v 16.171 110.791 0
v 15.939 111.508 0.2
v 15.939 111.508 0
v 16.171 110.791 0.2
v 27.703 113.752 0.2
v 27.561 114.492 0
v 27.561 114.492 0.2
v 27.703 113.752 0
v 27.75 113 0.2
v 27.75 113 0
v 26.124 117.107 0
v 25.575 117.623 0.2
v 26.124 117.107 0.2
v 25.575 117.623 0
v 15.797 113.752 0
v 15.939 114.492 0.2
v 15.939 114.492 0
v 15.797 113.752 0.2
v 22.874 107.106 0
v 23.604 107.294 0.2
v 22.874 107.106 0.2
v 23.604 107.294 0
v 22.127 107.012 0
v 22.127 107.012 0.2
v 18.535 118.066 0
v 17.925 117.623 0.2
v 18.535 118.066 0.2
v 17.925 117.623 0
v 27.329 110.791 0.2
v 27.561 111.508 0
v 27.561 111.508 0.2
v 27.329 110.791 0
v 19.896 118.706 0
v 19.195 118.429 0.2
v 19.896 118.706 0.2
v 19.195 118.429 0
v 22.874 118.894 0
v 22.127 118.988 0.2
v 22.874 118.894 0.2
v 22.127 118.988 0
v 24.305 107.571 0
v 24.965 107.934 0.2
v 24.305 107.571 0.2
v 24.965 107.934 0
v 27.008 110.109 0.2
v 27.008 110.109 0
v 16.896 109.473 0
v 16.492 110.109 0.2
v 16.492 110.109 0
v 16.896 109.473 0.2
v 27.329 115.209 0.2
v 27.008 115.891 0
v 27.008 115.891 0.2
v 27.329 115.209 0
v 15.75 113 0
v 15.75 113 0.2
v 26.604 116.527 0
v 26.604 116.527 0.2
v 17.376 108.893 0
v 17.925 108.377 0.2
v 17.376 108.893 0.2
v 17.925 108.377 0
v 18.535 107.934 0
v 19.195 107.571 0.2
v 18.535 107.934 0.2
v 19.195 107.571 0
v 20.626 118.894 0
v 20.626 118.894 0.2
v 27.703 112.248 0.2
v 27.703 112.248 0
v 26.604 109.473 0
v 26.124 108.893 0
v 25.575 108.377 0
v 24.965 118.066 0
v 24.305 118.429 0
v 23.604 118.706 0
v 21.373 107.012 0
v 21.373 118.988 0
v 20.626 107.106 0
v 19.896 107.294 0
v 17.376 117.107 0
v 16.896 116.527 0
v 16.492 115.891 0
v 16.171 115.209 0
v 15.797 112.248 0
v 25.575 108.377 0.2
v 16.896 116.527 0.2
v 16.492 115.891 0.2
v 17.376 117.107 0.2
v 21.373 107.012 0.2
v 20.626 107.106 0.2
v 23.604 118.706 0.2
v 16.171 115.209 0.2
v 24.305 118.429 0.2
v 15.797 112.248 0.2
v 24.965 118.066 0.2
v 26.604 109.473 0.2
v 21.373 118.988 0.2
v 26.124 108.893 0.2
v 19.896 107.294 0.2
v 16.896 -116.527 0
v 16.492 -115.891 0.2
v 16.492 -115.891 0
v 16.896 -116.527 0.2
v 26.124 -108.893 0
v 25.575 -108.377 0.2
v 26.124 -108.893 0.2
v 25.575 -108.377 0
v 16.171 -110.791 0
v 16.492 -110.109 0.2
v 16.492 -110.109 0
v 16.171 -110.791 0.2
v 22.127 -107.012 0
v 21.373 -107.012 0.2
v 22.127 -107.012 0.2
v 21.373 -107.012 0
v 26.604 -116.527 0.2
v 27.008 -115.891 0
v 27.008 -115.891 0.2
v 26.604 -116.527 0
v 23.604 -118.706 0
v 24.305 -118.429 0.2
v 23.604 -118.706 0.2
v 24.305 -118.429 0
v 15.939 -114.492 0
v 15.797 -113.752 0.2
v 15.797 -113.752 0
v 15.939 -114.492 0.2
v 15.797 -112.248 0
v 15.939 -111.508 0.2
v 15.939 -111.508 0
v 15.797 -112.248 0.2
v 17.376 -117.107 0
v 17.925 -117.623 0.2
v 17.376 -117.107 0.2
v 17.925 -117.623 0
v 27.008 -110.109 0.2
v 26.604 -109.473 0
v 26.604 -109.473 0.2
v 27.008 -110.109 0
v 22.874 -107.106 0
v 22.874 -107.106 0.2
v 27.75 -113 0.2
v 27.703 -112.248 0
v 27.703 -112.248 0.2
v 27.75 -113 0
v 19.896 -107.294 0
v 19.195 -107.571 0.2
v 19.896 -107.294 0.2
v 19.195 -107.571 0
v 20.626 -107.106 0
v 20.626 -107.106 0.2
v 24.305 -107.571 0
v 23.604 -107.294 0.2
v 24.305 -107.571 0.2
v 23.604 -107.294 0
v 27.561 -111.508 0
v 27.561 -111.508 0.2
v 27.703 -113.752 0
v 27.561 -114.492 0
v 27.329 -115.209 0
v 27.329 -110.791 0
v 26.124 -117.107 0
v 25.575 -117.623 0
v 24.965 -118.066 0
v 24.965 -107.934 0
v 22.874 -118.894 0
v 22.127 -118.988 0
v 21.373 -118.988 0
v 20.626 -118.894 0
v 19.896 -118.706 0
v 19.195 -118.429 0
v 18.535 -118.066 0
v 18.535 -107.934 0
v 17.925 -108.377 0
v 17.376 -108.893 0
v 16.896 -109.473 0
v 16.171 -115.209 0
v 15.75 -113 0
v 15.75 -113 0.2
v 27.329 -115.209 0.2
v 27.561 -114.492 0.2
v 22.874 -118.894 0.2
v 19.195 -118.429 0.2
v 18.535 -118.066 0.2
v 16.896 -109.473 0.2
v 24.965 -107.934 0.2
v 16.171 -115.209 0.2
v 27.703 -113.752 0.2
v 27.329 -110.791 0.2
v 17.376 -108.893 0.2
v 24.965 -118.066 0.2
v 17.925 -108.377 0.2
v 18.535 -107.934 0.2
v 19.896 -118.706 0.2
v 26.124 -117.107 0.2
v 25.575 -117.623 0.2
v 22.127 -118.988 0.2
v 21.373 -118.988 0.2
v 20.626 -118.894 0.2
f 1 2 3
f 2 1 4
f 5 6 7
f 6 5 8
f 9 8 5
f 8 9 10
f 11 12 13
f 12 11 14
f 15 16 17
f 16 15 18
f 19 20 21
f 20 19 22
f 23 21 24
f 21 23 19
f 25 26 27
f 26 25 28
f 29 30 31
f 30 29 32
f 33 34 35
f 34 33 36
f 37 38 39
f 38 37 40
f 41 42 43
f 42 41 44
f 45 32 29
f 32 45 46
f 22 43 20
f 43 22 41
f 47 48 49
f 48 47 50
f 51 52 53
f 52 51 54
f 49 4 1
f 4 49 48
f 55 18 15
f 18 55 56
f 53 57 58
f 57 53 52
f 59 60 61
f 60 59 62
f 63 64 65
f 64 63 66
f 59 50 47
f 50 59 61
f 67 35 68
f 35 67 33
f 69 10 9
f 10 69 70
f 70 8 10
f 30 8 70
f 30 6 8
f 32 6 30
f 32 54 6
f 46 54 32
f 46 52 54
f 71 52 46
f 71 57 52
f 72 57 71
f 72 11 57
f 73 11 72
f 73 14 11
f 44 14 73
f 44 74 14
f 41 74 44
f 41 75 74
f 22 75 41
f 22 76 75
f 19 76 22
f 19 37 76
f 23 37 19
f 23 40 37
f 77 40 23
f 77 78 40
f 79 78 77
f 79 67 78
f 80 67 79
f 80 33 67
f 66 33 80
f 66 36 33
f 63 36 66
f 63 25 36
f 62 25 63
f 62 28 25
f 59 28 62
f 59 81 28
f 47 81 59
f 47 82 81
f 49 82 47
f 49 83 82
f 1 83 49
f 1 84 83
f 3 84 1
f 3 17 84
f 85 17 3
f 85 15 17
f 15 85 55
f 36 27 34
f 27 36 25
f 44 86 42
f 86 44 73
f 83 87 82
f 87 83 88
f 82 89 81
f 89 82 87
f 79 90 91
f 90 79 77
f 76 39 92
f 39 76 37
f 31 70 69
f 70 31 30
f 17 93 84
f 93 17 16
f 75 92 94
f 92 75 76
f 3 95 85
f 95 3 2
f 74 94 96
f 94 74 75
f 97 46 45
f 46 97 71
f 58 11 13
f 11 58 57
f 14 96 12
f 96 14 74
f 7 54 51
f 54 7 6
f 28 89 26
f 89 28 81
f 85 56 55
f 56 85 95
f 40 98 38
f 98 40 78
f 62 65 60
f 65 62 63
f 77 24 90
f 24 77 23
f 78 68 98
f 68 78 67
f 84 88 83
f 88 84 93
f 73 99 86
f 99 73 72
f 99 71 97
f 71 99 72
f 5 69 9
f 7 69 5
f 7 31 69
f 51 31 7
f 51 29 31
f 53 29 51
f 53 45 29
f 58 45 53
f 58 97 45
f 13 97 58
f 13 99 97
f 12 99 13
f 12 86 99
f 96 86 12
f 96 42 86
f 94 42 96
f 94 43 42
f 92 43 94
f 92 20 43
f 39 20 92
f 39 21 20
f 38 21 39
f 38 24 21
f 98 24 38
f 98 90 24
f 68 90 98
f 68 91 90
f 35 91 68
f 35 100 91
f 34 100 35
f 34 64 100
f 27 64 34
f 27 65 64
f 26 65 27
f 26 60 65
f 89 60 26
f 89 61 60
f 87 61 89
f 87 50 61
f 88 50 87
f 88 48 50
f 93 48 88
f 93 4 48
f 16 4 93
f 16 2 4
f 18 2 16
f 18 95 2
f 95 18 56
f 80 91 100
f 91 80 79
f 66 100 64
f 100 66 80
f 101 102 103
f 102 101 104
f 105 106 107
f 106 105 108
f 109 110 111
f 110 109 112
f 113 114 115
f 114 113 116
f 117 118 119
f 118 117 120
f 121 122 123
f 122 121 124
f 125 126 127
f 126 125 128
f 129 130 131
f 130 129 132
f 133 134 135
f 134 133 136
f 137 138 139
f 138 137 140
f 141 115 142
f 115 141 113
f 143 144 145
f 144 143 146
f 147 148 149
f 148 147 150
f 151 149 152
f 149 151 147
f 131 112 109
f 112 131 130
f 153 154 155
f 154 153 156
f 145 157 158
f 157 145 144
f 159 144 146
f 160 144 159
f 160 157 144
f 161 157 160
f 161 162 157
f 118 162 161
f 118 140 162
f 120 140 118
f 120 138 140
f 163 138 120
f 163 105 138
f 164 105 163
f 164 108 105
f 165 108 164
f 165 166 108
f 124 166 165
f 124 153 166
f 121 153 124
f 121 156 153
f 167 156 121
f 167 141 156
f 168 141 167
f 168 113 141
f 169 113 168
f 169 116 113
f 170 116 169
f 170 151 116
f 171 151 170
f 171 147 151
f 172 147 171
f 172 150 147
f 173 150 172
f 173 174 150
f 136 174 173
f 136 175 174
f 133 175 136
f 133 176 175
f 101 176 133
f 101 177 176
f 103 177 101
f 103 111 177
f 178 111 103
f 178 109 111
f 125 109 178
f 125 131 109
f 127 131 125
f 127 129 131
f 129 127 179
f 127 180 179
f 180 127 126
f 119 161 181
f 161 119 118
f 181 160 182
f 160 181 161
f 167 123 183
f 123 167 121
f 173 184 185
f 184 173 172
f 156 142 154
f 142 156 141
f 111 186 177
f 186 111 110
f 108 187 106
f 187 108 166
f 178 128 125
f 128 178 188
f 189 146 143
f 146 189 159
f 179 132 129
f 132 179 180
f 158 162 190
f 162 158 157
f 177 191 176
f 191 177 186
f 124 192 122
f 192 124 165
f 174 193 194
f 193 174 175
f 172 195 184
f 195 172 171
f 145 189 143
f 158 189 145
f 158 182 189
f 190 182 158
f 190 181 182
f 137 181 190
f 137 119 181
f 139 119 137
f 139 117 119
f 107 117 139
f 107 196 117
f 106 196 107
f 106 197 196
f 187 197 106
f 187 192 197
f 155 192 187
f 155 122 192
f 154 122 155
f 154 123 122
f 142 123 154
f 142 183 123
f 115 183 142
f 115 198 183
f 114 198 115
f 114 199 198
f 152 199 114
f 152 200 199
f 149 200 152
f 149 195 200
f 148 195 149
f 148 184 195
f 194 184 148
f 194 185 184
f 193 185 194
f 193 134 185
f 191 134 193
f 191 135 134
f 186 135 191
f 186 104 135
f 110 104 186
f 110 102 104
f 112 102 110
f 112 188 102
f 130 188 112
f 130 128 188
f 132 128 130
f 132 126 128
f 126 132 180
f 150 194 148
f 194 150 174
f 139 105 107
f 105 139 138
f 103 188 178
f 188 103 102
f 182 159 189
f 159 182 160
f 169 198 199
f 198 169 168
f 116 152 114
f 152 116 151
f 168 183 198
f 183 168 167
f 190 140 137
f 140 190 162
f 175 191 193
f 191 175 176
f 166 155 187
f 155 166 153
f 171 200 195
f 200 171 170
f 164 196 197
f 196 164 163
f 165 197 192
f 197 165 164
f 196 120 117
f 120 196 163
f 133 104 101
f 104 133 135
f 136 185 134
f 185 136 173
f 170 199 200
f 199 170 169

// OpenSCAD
union() {
  translate([21.75, 113, 0]) {
    cylinder(h = 0.2, r = 6);
  }
  translate([21.75, -113, 0]) {
    cylinder(h = 0.2, r = 6);
  }
}
$fn = 50;
